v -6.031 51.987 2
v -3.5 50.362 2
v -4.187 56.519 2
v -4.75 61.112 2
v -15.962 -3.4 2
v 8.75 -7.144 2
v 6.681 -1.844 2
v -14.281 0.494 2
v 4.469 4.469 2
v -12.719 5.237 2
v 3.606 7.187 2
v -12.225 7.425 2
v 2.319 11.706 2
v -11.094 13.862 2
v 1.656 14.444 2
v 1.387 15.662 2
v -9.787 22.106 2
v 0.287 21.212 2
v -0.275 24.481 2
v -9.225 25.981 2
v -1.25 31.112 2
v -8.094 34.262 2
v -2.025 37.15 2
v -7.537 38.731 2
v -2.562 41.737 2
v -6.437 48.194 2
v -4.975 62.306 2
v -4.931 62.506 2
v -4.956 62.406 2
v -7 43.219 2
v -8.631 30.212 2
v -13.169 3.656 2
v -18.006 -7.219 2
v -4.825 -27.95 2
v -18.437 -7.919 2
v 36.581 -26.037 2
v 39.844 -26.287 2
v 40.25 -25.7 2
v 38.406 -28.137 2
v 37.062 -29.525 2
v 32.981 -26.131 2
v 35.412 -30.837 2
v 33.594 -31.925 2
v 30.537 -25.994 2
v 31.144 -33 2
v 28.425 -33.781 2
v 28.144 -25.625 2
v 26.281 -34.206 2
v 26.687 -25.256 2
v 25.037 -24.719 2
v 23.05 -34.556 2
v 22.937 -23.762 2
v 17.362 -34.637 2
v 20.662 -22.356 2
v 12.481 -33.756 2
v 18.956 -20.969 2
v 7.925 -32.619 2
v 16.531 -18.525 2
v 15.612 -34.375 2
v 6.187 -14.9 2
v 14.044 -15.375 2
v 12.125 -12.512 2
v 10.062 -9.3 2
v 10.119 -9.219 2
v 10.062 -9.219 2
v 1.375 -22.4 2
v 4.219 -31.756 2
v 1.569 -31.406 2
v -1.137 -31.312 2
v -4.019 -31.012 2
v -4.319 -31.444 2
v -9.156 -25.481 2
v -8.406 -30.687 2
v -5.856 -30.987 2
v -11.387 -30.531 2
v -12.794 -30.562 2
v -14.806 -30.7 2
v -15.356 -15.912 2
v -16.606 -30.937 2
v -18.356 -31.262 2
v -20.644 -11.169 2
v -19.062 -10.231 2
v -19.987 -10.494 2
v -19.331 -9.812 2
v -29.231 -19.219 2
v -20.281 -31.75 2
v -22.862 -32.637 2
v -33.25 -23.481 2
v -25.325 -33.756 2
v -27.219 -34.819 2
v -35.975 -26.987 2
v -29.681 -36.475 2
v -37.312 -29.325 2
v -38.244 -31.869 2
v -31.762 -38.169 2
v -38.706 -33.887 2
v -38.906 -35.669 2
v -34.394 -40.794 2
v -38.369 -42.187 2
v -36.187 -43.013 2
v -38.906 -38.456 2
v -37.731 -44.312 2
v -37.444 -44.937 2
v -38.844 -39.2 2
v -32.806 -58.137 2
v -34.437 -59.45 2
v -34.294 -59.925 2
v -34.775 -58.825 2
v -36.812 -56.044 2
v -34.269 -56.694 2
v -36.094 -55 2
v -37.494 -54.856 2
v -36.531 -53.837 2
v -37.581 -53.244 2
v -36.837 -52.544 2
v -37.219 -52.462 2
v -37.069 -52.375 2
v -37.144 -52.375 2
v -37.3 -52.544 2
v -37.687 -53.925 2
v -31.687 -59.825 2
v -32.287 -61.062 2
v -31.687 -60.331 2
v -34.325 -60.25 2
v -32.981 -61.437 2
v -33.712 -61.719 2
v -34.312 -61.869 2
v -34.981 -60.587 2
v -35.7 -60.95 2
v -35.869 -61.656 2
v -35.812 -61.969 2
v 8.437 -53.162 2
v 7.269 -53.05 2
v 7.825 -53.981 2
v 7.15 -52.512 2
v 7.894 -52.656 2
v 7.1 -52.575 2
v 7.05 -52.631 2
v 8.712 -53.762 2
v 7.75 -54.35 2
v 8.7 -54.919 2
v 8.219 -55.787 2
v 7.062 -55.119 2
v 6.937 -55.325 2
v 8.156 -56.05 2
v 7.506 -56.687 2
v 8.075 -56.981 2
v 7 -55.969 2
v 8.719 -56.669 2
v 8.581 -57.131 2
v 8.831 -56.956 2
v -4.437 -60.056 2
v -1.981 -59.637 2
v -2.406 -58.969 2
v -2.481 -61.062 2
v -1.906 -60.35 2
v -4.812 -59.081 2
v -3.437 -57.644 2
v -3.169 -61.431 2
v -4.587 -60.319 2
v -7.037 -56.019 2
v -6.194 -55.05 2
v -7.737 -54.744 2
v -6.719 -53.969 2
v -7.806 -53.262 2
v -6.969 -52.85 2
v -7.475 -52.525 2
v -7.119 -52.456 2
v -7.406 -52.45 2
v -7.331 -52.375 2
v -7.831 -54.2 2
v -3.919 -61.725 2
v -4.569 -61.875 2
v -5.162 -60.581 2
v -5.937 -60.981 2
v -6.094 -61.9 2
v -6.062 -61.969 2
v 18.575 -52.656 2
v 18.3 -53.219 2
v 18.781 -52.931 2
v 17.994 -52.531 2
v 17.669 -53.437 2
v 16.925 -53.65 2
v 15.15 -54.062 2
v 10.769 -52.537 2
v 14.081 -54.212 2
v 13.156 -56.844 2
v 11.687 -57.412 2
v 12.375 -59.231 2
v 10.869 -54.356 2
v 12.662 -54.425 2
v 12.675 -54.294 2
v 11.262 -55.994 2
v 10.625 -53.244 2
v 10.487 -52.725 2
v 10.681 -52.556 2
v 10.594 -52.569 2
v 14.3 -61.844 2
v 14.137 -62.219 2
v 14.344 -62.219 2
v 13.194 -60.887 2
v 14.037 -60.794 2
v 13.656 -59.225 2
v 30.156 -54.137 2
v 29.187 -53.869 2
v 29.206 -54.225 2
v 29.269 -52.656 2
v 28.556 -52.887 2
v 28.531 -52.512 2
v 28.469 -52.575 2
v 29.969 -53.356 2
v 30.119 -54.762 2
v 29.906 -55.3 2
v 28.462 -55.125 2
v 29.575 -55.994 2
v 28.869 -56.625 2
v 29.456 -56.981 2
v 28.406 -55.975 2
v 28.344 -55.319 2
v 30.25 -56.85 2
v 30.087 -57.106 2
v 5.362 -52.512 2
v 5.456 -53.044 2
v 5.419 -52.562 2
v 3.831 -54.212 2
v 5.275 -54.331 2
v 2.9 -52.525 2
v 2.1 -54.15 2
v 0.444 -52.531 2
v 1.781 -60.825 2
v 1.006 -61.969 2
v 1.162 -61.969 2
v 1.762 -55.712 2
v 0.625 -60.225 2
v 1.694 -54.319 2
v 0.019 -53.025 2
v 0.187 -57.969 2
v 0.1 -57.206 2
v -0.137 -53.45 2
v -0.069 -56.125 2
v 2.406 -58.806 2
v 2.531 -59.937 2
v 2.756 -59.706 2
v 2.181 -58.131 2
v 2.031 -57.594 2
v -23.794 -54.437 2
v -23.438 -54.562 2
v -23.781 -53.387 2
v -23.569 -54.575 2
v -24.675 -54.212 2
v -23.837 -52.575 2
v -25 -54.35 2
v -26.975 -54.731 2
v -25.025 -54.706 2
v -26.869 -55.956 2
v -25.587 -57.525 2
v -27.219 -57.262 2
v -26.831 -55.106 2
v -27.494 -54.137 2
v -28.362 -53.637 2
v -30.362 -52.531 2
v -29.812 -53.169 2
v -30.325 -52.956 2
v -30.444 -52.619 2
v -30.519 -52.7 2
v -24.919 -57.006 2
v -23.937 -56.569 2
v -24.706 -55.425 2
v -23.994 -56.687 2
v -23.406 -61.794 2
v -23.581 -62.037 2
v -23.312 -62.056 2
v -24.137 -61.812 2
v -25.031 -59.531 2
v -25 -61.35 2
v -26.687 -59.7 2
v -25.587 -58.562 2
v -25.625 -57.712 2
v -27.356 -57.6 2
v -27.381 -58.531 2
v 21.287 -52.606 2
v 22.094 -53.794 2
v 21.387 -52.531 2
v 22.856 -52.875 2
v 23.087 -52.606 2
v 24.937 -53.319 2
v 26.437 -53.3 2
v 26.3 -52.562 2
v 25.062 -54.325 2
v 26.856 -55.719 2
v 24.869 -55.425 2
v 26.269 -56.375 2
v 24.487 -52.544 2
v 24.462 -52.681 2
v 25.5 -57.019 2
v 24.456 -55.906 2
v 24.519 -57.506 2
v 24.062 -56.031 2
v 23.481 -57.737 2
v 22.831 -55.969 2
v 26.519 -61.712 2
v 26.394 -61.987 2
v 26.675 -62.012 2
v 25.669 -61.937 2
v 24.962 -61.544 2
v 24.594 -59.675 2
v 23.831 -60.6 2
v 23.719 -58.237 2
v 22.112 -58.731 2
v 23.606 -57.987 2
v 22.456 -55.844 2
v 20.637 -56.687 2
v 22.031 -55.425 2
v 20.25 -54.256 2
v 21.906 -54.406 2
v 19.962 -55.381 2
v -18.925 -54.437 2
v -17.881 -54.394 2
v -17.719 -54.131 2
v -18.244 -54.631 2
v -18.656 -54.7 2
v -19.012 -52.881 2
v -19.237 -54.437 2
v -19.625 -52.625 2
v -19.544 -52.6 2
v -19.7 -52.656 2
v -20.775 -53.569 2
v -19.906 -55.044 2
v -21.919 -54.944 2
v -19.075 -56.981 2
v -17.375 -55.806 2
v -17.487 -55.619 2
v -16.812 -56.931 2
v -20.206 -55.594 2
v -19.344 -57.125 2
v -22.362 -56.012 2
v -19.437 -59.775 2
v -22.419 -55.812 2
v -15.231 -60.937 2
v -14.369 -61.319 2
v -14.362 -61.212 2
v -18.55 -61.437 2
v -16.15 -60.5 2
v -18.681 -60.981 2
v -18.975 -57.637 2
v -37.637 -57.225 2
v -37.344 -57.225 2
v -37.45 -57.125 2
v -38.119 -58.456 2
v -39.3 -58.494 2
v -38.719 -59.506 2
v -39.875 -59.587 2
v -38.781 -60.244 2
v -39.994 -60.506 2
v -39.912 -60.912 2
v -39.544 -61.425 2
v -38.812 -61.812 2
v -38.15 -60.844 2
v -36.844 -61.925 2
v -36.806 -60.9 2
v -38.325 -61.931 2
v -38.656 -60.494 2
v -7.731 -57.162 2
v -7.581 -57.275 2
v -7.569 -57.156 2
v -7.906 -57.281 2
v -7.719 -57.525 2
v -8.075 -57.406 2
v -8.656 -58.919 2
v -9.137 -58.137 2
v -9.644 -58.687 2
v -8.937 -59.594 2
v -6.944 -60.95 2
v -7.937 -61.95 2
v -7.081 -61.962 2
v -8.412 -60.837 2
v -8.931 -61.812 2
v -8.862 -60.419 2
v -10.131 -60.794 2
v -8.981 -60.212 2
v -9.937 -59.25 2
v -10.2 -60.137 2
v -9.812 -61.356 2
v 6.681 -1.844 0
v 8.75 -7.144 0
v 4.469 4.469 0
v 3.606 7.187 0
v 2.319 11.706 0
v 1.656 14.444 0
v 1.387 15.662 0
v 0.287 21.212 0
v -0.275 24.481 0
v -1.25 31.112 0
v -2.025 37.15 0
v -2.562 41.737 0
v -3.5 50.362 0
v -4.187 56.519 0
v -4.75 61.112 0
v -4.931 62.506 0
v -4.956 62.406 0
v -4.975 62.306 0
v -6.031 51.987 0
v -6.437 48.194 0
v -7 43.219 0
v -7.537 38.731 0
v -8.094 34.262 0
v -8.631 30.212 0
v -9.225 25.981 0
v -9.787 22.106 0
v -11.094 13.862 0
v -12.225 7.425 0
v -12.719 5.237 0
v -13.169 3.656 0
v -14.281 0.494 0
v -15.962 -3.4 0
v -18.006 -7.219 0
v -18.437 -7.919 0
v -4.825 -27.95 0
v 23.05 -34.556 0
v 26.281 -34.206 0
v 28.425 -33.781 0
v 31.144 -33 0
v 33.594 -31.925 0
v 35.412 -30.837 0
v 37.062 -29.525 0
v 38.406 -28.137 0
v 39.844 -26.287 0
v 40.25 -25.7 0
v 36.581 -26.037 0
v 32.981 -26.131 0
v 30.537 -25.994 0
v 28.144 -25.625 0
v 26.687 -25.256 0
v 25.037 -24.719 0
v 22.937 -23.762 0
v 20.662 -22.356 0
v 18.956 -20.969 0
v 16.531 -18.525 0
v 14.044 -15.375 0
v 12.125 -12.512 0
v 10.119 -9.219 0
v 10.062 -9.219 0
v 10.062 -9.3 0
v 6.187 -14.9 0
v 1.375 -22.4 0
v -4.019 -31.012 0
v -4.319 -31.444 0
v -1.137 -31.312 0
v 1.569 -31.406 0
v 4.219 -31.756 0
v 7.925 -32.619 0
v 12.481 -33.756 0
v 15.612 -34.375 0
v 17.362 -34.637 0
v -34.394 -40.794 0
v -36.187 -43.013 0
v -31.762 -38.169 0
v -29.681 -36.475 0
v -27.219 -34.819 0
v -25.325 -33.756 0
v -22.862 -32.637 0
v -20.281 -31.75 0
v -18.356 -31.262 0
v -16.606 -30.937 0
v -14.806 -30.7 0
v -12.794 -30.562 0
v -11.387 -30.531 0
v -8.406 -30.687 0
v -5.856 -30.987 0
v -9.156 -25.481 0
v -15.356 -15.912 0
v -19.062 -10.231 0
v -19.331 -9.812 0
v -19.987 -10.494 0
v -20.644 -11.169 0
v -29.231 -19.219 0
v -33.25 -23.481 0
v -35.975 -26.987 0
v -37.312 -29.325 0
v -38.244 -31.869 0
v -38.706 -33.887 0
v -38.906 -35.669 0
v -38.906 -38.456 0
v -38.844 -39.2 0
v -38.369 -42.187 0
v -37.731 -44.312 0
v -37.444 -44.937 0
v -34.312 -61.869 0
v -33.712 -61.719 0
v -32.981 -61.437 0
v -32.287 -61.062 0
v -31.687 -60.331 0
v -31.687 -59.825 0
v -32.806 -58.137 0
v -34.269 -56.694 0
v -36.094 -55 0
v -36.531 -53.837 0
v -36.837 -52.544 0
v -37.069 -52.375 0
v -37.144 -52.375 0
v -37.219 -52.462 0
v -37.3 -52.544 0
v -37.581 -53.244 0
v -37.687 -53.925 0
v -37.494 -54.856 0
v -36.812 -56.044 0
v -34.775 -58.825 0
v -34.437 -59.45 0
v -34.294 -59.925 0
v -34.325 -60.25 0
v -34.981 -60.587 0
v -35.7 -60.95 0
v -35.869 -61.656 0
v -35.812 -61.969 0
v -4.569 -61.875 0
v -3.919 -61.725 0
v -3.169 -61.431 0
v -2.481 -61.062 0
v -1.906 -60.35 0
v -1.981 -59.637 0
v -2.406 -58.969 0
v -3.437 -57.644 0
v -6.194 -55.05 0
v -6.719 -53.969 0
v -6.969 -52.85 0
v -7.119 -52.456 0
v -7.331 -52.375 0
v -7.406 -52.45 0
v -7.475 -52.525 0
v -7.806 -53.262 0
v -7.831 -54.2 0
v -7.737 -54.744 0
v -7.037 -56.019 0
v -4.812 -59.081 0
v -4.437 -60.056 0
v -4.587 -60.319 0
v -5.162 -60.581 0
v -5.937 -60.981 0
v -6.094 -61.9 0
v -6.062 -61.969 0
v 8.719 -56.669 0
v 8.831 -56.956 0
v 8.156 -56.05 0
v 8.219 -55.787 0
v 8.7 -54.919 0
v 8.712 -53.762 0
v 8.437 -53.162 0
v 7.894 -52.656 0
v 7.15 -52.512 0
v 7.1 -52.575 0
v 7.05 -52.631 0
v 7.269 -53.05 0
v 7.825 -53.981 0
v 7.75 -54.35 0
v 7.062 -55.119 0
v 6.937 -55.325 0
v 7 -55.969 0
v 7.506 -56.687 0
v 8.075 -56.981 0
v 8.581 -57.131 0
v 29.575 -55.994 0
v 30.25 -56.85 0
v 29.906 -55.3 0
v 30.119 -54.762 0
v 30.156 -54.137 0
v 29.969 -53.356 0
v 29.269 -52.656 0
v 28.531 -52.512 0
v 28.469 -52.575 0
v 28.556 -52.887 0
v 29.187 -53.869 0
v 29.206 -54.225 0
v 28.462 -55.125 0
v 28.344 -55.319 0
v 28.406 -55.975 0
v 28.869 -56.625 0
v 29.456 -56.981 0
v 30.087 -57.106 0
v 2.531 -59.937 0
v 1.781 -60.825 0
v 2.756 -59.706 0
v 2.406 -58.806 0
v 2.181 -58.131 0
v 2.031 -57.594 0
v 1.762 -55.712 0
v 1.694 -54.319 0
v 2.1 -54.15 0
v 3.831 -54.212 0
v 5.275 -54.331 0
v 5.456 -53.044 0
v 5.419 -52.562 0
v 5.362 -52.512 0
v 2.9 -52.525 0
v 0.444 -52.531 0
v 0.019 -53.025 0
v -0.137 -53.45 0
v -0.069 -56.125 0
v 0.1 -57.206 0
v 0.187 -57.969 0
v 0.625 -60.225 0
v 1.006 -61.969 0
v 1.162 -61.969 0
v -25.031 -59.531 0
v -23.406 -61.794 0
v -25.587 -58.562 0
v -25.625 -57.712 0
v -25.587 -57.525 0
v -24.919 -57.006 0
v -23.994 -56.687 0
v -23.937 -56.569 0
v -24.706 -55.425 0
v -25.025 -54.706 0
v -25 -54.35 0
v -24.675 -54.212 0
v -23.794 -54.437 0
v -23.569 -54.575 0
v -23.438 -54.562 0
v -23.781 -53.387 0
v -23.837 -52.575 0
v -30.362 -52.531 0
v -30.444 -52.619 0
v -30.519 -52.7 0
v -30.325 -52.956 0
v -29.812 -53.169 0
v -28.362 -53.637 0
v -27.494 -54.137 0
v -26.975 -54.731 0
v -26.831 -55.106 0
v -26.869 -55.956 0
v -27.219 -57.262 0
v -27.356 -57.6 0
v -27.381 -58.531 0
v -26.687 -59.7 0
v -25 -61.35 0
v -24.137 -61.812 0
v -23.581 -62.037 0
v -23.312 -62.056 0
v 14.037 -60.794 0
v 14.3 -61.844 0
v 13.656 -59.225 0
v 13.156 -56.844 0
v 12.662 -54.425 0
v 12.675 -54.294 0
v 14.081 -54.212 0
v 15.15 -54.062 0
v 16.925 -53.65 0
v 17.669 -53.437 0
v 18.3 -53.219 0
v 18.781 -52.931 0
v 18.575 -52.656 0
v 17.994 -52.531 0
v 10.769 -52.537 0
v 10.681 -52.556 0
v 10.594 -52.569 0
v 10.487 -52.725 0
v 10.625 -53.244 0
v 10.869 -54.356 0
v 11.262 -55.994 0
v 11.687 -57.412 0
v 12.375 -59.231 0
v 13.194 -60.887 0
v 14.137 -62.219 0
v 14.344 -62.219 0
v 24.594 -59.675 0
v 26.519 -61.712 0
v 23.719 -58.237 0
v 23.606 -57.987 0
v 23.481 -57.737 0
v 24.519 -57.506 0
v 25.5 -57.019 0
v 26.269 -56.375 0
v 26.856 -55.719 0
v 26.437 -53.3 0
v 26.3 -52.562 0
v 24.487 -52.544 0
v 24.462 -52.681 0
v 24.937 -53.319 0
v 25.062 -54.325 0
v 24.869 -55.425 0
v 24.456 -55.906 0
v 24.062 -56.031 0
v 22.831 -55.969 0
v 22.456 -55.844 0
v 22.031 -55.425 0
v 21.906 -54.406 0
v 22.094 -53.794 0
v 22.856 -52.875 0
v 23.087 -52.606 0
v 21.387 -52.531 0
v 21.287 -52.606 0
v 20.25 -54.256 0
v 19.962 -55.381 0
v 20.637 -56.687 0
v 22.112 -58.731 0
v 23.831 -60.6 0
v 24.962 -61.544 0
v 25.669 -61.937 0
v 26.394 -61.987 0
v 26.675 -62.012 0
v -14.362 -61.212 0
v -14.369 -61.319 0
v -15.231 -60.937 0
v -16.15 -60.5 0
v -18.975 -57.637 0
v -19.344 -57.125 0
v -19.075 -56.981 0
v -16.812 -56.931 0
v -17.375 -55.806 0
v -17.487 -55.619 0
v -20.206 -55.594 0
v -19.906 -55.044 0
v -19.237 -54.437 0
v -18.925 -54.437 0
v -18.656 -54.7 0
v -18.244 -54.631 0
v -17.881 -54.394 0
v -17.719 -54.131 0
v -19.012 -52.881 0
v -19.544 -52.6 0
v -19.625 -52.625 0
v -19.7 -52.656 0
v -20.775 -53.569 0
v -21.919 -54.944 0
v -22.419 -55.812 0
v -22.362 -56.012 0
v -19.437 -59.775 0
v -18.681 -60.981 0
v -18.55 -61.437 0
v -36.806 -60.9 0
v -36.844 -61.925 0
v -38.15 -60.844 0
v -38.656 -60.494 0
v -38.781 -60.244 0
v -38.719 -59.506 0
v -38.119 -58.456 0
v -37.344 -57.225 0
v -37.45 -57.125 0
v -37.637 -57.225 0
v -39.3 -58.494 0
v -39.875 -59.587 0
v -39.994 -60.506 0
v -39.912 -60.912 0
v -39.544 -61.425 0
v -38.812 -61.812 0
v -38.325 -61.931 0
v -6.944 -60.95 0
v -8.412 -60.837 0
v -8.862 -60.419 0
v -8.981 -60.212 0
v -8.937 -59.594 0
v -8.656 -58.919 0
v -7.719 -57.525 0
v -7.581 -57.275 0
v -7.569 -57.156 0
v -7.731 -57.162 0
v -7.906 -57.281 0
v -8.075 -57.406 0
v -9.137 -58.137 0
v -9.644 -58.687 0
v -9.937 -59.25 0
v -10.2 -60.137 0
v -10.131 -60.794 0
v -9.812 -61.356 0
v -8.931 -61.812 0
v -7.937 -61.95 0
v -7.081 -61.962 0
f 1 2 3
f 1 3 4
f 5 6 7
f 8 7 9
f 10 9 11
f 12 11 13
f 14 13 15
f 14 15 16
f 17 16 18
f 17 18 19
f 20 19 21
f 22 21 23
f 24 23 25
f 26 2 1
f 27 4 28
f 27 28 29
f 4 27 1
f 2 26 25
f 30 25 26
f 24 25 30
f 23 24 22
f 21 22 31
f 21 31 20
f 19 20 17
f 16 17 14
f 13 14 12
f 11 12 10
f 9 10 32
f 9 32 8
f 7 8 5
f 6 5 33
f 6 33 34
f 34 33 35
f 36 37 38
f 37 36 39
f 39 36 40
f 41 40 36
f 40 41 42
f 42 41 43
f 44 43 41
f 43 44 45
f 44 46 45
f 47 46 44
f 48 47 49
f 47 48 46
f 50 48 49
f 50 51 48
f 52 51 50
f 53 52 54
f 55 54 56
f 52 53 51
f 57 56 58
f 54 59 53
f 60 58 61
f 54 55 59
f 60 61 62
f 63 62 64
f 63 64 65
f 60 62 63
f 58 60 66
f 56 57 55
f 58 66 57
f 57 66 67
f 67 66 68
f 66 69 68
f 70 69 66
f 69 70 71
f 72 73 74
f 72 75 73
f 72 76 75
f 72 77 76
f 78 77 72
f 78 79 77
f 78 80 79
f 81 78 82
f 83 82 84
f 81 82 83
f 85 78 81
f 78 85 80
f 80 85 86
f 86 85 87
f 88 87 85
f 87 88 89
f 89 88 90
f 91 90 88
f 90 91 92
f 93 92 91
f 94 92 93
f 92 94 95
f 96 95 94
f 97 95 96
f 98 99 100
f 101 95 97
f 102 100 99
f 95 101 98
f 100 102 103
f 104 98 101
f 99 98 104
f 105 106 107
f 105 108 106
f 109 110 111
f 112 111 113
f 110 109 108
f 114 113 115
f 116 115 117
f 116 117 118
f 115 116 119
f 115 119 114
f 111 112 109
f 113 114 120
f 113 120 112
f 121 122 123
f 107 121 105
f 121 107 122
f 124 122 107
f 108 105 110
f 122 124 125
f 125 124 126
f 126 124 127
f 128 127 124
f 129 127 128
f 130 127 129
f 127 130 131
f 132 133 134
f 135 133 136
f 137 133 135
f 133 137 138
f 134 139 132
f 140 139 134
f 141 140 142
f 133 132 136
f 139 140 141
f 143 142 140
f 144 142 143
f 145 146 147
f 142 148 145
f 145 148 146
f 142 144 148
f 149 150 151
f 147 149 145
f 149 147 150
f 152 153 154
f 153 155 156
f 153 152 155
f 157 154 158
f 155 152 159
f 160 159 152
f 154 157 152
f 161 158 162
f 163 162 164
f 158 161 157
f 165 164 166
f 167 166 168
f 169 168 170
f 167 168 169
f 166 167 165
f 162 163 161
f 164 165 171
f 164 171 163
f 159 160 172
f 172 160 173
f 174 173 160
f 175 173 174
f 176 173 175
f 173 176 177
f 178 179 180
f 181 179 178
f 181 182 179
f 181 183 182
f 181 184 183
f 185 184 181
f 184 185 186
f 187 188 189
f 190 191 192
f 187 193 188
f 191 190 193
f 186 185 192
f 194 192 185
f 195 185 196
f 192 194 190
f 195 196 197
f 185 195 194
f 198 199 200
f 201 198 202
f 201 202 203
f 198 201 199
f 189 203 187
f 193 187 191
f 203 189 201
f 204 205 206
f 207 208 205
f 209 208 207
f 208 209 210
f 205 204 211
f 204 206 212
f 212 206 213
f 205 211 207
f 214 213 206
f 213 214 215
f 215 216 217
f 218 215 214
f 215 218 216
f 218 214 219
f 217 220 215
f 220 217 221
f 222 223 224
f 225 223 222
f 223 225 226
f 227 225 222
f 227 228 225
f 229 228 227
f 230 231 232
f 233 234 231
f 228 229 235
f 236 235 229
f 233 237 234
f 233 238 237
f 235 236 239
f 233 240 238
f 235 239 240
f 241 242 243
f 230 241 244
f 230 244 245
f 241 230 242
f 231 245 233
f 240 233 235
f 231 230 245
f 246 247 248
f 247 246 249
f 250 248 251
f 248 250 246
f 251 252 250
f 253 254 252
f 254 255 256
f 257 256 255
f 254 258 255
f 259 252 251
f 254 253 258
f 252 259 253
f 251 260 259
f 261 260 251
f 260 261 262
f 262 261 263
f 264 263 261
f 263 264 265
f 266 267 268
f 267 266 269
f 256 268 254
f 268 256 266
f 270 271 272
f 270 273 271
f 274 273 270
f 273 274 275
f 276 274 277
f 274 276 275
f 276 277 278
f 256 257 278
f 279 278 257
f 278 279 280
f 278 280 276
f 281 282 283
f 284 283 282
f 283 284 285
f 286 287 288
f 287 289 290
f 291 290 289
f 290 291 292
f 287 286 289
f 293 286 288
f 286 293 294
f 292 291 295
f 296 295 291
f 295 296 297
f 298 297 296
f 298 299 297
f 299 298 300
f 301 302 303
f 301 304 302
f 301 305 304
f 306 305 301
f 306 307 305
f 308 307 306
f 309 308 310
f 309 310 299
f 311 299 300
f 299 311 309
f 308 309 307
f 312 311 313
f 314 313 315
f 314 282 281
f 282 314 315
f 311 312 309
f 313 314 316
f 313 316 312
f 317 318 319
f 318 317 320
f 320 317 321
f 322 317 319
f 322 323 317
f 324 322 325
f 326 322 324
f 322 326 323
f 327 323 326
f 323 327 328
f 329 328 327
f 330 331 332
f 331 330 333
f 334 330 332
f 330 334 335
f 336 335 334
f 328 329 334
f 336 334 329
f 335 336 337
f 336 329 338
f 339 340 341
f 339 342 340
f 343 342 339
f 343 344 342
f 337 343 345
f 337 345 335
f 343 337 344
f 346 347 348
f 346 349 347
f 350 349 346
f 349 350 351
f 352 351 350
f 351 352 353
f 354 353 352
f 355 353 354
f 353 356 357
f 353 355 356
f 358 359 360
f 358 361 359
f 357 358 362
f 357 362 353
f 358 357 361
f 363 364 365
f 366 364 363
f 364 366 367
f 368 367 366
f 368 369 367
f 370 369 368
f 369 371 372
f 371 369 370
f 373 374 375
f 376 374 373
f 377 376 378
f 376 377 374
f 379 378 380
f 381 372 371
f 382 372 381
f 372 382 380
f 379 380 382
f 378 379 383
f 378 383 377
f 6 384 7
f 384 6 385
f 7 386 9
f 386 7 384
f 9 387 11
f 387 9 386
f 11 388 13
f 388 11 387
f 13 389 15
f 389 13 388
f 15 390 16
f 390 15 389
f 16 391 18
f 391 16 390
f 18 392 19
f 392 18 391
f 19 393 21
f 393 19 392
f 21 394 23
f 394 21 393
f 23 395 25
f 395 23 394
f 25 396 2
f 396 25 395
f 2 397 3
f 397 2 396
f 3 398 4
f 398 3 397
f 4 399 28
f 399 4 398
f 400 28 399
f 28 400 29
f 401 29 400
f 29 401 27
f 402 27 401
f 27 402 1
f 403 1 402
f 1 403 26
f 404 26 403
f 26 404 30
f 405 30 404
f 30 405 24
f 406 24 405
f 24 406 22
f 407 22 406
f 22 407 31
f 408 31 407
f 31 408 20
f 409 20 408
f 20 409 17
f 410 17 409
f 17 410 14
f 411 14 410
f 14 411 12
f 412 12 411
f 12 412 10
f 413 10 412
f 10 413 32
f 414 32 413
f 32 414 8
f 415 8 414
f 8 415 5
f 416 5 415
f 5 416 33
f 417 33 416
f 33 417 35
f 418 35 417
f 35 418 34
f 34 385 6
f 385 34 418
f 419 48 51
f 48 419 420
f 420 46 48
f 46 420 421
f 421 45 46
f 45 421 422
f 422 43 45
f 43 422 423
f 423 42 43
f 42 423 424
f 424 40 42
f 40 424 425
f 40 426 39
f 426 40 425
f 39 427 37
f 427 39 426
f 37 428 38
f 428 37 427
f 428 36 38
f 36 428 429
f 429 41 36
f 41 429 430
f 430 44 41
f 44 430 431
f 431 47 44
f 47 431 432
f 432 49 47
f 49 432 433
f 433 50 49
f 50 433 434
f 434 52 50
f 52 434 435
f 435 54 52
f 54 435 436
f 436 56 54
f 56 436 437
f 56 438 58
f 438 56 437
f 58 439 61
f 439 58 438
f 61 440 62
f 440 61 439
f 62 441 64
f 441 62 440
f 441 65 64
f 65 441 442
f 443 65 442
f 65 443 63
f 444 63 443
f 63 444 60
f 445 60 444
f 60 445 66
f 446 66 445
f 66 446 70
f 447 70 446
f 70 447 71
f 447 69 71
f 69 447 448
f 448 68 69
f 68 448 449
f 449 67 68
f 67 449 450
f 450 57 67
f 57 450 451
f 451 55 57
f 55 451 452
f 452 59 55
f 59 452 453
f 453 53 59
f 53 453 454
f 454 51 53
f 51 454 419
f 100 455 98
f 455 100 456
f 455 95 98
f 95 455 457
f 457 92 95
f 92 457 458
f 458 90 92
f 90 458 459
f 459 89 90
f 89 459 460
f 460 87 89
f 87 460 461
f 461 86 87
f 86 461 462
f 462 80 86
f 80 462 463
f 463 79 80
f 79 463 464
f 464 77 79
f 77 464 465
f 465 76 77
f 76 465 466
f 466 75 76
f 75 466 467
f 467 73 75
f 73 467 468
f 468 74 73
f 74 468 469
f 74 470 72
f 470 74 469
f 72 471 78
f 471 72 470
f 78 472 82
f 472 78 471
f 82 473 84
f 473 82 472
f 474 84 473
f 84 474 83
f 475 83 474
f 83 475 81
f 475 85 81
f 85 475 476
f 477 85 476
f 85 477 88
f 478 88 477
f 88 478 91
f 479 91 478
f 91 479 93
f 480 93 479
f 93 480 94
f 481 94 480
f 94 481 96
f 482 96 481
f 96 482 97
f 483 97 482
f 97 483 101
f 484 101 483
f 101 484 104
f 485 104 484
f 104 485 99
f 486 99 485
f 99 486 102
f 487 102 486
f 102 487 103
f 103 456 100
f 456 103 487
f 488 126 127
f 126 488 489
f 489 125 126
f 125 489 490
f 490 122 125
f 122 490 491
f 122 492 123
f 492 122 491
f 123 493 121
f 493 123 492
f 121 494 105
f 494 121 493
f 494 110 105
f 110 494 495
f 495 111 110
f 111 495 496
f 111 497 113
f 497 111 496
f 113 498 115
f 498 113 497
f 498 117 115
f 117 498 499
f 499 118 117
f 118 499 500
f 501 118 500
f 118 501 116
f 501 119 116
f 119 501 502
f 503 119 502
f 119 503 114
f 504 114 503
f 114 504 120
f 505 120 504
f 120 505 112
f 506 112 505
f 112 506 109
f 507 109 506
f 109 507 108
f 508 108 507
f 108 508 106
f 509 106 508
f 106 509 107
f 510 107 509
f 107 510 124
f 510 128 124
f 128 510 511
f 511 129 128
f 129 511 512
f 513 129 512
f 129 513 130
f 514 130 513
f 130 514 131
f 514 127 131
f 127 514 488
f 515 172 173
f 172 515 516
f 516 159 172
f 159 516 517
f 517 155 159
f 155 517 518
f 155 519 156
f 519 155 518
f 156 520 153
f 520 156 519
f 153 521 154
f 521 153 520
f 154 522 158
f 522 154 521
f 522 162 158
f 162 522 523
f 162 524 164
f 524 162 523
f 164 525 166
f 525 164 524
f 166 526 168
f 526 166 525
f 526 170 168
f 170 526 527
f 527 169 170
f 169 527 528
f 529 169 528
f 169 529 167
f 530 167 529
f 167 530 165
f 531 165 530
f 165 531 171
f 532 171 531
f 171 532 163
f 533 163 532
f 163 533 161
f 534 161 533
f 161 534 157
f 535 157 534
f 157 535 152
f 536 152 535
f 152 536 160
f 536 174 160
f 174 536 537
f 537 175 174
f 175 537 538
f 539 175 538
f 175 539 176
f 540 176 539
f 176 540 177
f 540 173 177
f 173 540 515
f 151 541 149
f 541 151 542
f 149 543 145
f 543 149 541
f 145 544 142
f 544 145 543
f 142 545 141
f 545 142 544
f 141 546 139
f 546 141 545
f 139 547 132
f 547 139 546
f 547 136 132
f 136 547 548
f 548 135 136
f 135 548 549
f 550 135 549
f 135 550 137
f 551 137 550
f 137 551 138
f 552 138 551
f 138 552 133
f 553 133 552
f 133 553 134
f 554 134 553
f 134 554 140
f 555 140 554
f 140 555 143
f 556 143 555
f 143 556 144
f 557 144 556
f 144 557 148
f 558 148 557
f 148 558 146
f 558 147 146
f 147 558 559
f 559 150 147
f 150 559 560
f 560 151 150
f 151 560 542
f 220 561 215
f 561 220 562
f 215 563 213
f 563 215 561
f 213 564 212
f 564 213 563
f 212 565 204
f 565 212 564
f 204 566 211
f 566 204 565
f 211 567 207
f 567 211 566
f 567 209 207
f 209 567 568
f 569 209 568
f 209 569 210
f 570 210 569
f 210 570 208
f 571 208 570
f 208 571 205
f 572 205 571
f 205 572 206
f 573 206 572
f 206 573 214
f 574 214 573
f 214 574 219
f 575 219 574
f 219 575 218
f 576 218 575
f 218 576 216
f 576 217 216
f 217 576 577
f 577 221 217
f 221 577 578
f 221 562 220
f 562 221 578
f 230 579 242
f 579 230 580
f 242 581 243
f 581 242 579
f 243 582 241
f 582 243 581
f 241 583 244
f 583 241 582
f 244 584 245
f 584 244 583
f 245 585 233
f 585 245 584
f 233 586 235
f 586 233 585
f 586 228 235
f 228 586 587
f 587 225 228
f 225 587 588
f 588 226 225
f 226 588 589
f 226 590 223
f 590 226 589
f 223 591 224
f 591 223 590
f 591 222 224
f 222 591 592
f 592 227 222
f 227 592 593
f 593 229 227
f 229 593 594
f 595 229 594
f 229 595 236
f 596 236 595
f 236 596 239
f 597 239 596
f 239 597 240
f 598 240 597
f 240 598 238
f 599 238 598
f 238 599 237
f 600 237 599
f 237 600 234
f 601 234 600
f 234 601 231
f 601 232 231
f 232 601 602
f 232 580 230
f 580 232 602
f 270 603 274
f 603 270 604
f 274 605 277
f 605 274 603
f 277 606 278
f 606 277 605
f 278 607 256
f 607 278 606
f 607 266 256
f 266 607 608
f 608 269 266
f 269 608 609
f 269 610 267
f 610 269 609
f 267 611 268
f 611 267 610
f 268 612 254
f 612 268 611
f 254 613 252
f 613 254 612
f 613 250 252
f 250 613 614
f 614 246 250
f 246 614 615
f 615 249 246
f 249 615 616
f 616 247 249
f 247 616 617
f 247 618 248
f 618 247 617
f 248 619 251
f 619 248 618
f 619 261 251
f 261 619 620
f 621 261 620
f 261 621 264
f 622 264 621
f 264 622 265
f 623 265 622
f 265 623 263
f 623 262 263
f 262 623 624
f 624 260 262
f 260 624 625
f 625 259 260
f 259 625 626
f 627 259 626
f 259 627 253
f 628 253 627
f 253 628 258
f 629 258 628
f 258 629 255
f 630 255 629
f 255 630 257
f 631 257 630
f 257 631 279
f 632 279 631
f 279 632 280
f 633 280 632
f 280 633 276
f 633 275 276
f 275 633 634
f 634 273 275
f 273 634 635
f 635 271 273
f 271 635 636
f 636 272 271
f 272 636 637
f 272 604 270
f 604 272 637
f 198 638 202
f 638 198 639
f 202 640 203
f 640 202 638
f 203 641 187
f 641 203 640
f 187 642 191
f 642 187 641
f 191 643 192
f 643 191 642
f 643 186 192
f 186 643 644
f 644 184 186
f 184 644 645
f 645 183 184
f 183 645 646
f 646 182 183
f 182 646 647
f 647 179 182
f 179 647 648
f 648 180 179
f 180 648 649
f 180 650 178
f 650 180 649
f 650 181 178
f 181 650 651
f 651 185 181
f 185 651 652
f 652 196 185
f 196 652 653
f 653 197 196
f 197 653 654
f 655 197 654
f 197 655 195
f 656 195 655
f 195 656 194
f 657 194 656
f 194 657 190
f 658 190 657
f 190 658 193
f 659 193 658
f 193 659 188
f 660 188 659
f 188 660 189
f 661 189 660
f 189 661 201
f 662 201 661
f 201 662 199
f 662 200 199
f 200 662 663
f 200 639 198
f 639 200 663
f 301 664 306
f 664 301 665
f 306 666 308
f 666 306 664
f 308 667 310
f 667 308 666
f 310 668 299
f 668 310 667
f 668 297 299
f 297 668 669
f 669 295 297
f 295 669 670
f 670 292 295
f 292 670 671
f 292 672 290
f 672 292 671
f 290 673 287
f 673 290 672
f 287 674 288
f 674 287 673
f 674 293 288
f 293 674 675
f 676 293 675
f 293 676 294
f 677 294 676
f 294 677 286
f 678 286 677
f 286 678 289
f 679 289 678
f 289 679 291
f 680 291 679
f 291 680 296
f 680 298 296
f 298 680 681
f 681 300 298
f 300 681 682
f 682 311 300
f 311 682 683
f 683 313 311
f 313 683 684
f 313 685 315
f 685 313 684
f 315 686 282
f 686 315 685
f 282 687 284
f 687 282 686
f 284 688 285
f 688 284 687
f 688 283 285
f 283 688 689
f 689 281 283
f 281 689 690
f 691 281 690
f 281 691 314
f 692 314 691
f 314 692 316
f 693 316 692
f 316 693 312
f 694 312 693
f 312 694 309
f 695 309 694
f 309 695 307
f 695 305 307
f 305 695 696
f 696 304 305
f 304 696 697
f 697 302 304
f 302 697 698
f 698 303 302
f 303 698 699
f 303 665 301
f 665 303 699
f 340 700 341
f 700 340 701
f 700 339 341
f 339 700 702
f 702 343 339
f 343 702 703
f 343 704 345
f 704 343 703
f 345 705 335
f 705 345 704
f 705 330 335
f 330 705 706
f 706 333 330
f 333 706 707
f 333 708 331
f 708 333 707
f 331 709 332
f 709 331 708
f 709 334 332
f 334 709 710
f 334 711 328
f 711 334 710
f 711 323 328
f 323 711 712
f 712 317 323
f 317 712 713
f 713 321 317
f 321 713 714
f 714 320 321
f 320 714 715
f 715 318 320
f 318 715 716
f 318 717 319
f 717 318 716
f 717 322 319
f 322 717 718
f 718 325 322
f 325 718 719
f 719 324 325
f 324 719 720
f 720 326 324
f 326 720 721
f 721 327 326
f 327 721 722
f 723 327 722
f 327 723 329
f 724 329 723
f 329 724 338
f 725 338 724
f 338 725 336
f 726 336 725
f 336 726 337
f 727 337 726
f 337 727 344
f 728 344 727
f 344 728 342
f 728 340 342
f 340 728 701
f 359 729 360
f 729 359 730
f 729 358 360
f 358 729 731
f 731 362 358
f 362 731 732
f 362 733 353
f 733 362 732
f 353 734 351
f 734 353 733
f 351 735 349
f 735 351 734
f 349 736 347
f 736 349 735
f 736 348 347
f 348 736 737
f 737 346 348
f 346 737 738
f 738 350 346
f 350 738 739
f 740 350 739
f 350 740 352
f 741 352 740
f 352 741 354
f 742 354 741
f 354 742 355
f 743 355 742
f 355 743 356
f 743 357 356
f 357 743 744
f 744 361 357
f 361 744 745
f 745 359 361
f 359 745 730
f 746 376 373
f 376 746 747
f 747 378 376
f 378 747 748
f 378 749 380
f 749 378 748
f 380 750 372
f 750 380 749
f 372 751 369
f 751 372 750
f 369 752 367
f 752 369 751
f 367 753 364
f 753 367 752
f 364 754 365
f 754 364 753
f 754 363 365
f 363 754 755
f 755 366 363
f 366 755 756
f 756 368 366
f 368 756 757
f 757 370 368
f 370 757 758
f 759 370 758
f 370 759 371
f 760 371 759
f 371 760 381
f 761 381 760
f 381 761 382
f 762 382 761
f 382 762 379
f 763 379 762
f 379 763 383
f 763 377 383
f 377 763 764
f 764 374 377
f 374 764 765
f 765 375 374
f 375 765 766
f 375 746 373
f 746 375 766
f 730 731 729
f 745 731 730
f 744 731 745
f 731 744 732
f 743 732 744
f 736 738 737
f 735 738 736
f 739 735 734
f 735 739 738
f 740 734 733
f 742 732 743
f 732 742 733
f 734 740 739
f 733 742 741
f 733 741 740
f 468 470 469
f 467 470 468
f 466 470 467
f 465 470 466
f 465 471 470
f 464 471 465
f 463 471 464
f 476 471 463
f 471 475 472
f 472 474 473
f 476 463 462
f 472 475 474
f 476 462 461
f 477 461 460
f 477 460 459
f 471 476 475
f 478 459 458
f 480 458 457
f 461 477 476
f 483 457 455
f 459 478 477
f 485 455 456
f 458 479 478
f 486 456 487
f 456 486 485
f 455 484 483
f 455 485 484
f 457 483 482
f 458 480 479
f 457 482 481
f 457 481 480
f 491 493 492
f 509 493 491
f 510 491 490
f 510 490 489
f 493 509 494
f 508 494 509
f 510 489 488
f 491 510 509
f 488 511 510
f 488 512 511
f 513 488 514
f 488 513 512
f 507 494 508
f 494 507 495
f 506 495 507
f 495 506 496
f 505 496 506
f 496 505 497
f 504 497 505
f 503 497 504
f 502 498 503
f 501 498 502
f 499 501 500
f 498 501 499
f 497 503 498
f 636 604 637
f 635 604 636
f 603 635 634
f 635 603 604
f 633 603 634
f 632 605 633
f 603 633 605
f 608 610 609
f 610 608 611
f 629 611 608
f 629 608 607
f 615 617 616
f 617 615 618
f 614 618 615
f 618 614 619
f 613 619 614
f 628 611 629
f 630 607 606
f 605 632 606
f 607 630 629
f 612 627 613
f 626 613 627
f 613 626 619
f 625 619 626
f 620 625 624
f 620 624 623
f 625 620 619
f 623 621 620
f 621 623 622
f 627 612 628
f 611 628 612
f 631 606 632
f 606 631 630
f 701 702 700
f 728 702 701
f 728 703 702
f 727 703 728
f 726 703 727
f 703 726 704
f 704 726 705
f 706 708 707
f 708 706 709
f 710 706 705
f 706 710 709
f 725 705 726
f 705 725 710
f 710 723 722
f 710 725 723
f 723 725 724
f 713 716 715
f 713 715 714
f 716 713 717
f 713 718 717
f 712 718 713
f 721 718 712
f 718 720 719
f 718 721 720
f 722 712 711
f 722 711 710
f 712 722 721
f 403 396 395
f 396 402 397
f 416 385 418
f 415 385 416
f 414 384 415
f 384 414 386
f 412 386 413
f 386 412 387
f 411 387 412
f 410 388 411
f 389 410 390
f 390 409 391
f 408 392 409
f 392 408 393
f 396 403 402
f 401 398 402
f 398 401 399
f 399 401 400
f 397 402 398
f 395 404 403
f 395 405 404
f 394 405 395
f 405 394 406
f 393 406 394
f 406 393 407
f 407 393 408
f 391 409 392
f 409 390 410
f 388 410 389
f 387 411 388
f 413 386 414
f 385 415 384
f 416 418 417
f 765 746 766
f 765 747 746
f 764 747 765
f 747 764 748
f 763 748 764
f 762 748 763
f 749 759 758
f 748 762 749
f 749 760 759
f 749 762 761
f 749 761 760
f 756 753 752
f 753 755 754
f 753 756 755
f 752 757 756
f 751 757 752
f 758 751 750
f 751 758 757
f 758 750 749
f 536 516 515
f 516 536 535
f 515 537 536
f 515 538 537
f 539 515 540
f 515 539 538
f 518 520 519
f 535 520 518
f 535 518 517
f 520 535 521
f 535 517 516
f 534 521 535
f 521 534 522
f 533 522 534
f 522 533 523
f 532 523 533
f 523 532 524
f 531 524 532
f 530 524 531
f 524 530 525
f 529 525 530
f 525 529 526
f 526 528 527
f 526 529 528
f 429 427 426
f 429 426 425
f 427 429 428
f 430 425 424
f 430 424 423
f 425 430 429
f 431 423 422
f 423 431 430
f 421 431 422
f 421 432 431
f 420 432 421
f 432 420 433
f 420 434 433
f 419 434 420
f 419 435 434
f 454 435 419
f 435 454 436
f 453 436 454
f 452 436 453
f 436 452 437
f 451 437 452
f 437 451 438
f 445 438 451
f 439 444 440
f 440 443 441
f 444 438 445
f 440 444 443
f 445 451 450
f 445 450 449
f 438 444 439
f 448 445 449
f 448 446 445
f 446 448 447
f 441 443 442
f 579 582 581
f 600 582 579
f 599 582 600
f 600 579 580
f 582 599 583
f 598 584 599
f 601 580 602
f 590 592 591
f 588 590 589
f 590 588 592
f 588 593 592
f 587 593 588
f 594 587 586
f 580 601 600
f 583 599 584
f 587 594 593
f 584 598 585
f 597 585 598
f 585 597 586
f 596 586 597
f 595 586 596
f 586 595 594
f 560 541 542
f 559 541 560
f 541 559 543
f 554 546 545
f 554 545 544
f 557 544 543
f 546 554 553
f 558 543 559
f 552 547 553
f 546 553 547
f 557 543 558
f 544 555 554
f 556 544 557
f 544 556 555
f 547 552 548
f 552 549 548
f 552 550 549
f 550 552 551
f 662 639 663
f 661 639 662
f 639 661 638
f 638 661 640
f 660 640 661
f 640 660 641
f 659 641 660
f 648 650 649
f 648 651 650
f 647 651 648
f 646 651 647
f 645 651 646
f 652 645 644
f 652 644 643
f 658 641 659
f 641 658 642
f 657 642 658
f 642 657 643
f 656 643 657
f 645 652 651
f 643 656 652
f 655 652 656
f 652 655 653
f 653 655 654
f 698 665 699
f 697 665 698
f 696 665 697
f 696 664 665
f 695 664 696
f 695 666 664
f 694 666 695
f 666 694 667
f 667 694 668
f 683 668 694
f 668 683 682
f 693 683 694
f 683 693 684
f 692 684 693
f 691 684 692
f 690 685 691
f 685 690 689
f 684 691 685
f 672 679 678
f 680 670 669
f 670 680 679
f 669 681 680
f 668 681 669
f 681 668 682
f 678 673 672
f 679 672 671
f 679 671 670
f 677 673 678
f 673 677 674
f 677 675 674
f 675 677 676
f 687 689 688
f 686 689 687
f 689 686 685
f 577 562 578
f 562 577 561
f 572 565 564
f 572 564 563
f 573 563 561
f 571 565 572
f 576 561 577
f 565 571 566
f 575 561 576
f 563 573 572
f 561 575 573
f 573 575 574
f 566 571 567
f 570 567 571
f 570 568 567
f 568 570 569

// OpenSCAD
module 7096dc80c5bb6a227a755e5a13092af8_1()
{
 /* Generated by trace2scad version 20150415
    http://aggregate.org/MAKE/TRACE2SCAD/
    Optimized model has 387/4796 original points
 */
 color([0.48, 0.48, 0.48])
 assign(minx=0) /* polygon minx=39 */
 assign(miny=0) /* polygon miny=45 */
 assign(maxx=12880) /* polygon maxx=12880 */
 assign(maxy=20000) /* polygon maxy=20001 */
 assign(dx=maxx-minx)
 assign(dy=maxy-miny)
 assign(maxd=((dx>dy)?dx:dy))
 scale([1/maxd, 1/maxd, 1])
 translate([-minx-dx/2, -miny-dy/2, 0])
 linear_extrude(height=1, convexity=387)
 union() {
  union() {
   polygon([[5647,19985],[5644,19969],[5475,18318],[5410,17711],[5320,16915],[5234,16197],[5145,15482],[5059,14834],[4964,14157],[4874,13537],[4665,12218],[4484,11188],[4405,10838],[4333,10585],[4155,10079],[3886,9456],[3559,8845],[3490,8733],[5668,5528],[7840,8857],[7509,9705],[7155,10715],[7017,11150],[6811,11873],[6705,12311],[6662,12506],[6486,13394],[6396,13917],[6240,14978],[6116,15944],[6030,16678],[5880,18058],[5770,19043],[5680,19778],[5651,20001]], convexity=6);
   polygon([[8050,8518],[8050,8512],[7430,7616],[6660,6416],[5797,5038],[5749,4969],[6258,4990],[6691,4975],[7115,4919],[7708,4781],[8437,4599],[8938,4500],[9218,4458],[10128,4471],[10645,4527],[10988,4595],[11423,4720],[11815,4892],[12106,5066],[12370,5276],[12585,5498],[12815,5794],[12880,5888],[12293,5834],[11717,5819],[11326,5841],[10943,5900],[10710,5959],[10446,6045],[10110,6198],[9746,6423],[9473,6645],[9085,7036],[8687,7540],[8380,7998],[8059,8525],[8050,8525]], convexity=9);
   polygon([[3242,8321],[3137,8213],[1763,6925],[1120,6243],[684,5682],[470,5308],[321,4901],[247,4578],[215,4293],[215,3847],[225,3728],[301,3250],[403,2910],[449,2810],[650,3118],[937,3473],[1358,3893],[1691,4164],[2085,4429],[2388,4599],[2782,4778],[3195,4920],[3503,4998],[3783,5050],[4071,5088],[4393,5110],[4618,5115],[5095,5090],[5503,5042],[4975,5923],[3983,7454],[3390,8363],[3347,8430]], convexity=7);
   polygon([[485,1606],[472,1593],[427,1481],[410,1372],[441,1223],[550,1033],[876,588],[930,488],[953,412],[948,360],[843,306],[728,248],[701,135],[710,85],[950,101],[1046,125],[1163,170],[1274,230],[1370,347],[1370,428],[1191,698],[957,929],[665,1200],[595,1386],[546,1593],[509,1620],[497,1620]], convexity=8);
   polygon([[5255,1608],[5244,1596],[5191,1478],[5187,1328],[5202,1241],[5314,1037],[5670,547],[5730,391],[5706,349],[5614,307],[5490,243],[5465,96],[5470,85],[5709,100],[5813,124],[5933,171],[6043,230],[6135,344],[6123,458],[6055,565],[5890,777],[5449,1192],[5365,1365],[5325,1544],[5301,1607],[5267,1620]], convexity=8);
   polygon([[6904,1596],[6511,1595],[6443,1516],[6418,1448],[6429,1020],[6456,847],[6470,725],[6540,364],[6601,85],[6626,85],[6725,268],[6845,410],[6881,447],[6825,591],[6789,699],[6765,785],[6722,1086],[6711,1309],[6776,1336],[7053,1326],[7284,1307],[7313,1513],[7307,1590],[7298,1598]], convexity=10);
   polygon([[7576,1588],[7568,1579],[7603,1512],[7692,1363],[7680,1304],[7570,1181],[7550,1148],[7560,1045],[7641,930],[7732,883],[7813,859],[7853,887],[7835,933],[7745,1032],[7755,1074],[7832,1213],[7834,1398],[7790,1494],[7703,1575],[7584,1598]], convexity=10);
   polygon([[11000,1593],[10995,1588],[11009,1538],[11110,1381],[11113,1324],[10994,1180],[10975,1149],[10985,1044],[11059,940],[11153,883],[11254,863],[11280,904],[11172,1041],[11225,1152],[11259,1238],[11265,1338],[11235,1463],[11123,1575],[11005,1598]], convexity=10);
   polygon([[1569,1581],[1557,1568],[1588,1527],[1670,1493],[1902,1418],[2041,1338],[2124,1243],[2147,1183],[2141,1047],[2085,838],[2063,784],[2059,635],[2170,448],[2440,184],[2578,110],[2667,74],[2710,71],[2695,113],[2435,475],[2346,630],[2340,766],[2346,796],[2453,879],[2601,930],[2610,949],[2487,1132],[2436,1247],[2440,1304],[2492,1326],[2633,1290],[2669,1268],[2690,1270],[2635,1458],[2626,1588],[1582,1595]], convexity=13);
   polygon([[8149,1591],[8135,1589],[8118,1564],[8140,1481],[8179,1303],[8242,1041],[8310,814],[8420,523],[8551,258],[8702,45],[8735,45],[8728,105],[8686,273],[8625,524],[8545,905],[8466,1292],[8468,1313],[8693,1326],[8864,1350],[9148,1416],[9267,1450],[9368,1485],[9445,1531],[9412,1575],[9319,1595],[8163,1594]], convexity=9);
   polygon([[9854,1589],[9846,1583],[9680,1319],[9634,1139],[9742,930],[9978,603],[10253,304],[10434,153],[10547,90],[10663,82],[10708,78],[10683,126],[10375,452],[10235,682],[10217,722],[10197,762],[10363,799],[10520,877],[10643,980],[10737,1085],[10670,1472],[10648,1590],[10358,1593],[10354,1571],[10430,1469],[10450,1308],[10419,1132],[10353,1055],[10290,1035],[10093,1045],[10033,1065],[9965,1132],[9945,1295],[9975,1393],[10097,1540],[10134,1583],[9862,1595]], convexity=13);
   polygon([[3300,1580],[3288,1575],[3116,1429],[2933,1209],[2853,1070],[2862,1038],[3330,436],[3451,243],[3472,170],[4141,189],[4142,206],[4003,250],[3856,320],[3404,778],[3345,860],[3388,883],[3750,891],[3660,1071],[3642,1101],[3207,1105],[3255,1193],[3362,1290],[3412,1290],[3455,1248],[3521,1259],[3579,1297],[3605,1339],[3398,1539],[3313,1584]], convexity=12);
   polygon([[433,852],[418,844],[152,641],[60,466],[41,319],[54,254],[113,172],[230,110],[308,91],[545,92],[551,256],[336,265],[255,321],[235,361],[245,479],[341,647],[465,844],[448,860]], convexity=8);
   polygon([[5175,835],[5148,815],[4978,698],[4897,610],[4850,520],[4808,378],[4819,273],[4870,183],[5011,110],[5170,88],[5307,86],[5329,248],[5094,266],[5022,333],[5003,366],[5010,465],[5055,573],[5205,796],[5227,836],[5229,855],[5203,854]], convexity=8);
  }
 }
}

module 7096dc80c5bb6a227a755e5a13092af8()
{
 /* all layers combined, scaled to within a 1mm cube */
 scale([1, 1, 1/1])
 difference() {
  union() {
   scale([1,1,2]) translate([0,0,-0.5]) 7096dc80c5bb6a227a755e5a13092af8_1();
  }
  translate([0,0,-2]) cube([2,2,4],center=true);
 }
}

scale([125, 125, 2]) {
	7096dc80c5bb6a227a755e5a13092af8();
}
